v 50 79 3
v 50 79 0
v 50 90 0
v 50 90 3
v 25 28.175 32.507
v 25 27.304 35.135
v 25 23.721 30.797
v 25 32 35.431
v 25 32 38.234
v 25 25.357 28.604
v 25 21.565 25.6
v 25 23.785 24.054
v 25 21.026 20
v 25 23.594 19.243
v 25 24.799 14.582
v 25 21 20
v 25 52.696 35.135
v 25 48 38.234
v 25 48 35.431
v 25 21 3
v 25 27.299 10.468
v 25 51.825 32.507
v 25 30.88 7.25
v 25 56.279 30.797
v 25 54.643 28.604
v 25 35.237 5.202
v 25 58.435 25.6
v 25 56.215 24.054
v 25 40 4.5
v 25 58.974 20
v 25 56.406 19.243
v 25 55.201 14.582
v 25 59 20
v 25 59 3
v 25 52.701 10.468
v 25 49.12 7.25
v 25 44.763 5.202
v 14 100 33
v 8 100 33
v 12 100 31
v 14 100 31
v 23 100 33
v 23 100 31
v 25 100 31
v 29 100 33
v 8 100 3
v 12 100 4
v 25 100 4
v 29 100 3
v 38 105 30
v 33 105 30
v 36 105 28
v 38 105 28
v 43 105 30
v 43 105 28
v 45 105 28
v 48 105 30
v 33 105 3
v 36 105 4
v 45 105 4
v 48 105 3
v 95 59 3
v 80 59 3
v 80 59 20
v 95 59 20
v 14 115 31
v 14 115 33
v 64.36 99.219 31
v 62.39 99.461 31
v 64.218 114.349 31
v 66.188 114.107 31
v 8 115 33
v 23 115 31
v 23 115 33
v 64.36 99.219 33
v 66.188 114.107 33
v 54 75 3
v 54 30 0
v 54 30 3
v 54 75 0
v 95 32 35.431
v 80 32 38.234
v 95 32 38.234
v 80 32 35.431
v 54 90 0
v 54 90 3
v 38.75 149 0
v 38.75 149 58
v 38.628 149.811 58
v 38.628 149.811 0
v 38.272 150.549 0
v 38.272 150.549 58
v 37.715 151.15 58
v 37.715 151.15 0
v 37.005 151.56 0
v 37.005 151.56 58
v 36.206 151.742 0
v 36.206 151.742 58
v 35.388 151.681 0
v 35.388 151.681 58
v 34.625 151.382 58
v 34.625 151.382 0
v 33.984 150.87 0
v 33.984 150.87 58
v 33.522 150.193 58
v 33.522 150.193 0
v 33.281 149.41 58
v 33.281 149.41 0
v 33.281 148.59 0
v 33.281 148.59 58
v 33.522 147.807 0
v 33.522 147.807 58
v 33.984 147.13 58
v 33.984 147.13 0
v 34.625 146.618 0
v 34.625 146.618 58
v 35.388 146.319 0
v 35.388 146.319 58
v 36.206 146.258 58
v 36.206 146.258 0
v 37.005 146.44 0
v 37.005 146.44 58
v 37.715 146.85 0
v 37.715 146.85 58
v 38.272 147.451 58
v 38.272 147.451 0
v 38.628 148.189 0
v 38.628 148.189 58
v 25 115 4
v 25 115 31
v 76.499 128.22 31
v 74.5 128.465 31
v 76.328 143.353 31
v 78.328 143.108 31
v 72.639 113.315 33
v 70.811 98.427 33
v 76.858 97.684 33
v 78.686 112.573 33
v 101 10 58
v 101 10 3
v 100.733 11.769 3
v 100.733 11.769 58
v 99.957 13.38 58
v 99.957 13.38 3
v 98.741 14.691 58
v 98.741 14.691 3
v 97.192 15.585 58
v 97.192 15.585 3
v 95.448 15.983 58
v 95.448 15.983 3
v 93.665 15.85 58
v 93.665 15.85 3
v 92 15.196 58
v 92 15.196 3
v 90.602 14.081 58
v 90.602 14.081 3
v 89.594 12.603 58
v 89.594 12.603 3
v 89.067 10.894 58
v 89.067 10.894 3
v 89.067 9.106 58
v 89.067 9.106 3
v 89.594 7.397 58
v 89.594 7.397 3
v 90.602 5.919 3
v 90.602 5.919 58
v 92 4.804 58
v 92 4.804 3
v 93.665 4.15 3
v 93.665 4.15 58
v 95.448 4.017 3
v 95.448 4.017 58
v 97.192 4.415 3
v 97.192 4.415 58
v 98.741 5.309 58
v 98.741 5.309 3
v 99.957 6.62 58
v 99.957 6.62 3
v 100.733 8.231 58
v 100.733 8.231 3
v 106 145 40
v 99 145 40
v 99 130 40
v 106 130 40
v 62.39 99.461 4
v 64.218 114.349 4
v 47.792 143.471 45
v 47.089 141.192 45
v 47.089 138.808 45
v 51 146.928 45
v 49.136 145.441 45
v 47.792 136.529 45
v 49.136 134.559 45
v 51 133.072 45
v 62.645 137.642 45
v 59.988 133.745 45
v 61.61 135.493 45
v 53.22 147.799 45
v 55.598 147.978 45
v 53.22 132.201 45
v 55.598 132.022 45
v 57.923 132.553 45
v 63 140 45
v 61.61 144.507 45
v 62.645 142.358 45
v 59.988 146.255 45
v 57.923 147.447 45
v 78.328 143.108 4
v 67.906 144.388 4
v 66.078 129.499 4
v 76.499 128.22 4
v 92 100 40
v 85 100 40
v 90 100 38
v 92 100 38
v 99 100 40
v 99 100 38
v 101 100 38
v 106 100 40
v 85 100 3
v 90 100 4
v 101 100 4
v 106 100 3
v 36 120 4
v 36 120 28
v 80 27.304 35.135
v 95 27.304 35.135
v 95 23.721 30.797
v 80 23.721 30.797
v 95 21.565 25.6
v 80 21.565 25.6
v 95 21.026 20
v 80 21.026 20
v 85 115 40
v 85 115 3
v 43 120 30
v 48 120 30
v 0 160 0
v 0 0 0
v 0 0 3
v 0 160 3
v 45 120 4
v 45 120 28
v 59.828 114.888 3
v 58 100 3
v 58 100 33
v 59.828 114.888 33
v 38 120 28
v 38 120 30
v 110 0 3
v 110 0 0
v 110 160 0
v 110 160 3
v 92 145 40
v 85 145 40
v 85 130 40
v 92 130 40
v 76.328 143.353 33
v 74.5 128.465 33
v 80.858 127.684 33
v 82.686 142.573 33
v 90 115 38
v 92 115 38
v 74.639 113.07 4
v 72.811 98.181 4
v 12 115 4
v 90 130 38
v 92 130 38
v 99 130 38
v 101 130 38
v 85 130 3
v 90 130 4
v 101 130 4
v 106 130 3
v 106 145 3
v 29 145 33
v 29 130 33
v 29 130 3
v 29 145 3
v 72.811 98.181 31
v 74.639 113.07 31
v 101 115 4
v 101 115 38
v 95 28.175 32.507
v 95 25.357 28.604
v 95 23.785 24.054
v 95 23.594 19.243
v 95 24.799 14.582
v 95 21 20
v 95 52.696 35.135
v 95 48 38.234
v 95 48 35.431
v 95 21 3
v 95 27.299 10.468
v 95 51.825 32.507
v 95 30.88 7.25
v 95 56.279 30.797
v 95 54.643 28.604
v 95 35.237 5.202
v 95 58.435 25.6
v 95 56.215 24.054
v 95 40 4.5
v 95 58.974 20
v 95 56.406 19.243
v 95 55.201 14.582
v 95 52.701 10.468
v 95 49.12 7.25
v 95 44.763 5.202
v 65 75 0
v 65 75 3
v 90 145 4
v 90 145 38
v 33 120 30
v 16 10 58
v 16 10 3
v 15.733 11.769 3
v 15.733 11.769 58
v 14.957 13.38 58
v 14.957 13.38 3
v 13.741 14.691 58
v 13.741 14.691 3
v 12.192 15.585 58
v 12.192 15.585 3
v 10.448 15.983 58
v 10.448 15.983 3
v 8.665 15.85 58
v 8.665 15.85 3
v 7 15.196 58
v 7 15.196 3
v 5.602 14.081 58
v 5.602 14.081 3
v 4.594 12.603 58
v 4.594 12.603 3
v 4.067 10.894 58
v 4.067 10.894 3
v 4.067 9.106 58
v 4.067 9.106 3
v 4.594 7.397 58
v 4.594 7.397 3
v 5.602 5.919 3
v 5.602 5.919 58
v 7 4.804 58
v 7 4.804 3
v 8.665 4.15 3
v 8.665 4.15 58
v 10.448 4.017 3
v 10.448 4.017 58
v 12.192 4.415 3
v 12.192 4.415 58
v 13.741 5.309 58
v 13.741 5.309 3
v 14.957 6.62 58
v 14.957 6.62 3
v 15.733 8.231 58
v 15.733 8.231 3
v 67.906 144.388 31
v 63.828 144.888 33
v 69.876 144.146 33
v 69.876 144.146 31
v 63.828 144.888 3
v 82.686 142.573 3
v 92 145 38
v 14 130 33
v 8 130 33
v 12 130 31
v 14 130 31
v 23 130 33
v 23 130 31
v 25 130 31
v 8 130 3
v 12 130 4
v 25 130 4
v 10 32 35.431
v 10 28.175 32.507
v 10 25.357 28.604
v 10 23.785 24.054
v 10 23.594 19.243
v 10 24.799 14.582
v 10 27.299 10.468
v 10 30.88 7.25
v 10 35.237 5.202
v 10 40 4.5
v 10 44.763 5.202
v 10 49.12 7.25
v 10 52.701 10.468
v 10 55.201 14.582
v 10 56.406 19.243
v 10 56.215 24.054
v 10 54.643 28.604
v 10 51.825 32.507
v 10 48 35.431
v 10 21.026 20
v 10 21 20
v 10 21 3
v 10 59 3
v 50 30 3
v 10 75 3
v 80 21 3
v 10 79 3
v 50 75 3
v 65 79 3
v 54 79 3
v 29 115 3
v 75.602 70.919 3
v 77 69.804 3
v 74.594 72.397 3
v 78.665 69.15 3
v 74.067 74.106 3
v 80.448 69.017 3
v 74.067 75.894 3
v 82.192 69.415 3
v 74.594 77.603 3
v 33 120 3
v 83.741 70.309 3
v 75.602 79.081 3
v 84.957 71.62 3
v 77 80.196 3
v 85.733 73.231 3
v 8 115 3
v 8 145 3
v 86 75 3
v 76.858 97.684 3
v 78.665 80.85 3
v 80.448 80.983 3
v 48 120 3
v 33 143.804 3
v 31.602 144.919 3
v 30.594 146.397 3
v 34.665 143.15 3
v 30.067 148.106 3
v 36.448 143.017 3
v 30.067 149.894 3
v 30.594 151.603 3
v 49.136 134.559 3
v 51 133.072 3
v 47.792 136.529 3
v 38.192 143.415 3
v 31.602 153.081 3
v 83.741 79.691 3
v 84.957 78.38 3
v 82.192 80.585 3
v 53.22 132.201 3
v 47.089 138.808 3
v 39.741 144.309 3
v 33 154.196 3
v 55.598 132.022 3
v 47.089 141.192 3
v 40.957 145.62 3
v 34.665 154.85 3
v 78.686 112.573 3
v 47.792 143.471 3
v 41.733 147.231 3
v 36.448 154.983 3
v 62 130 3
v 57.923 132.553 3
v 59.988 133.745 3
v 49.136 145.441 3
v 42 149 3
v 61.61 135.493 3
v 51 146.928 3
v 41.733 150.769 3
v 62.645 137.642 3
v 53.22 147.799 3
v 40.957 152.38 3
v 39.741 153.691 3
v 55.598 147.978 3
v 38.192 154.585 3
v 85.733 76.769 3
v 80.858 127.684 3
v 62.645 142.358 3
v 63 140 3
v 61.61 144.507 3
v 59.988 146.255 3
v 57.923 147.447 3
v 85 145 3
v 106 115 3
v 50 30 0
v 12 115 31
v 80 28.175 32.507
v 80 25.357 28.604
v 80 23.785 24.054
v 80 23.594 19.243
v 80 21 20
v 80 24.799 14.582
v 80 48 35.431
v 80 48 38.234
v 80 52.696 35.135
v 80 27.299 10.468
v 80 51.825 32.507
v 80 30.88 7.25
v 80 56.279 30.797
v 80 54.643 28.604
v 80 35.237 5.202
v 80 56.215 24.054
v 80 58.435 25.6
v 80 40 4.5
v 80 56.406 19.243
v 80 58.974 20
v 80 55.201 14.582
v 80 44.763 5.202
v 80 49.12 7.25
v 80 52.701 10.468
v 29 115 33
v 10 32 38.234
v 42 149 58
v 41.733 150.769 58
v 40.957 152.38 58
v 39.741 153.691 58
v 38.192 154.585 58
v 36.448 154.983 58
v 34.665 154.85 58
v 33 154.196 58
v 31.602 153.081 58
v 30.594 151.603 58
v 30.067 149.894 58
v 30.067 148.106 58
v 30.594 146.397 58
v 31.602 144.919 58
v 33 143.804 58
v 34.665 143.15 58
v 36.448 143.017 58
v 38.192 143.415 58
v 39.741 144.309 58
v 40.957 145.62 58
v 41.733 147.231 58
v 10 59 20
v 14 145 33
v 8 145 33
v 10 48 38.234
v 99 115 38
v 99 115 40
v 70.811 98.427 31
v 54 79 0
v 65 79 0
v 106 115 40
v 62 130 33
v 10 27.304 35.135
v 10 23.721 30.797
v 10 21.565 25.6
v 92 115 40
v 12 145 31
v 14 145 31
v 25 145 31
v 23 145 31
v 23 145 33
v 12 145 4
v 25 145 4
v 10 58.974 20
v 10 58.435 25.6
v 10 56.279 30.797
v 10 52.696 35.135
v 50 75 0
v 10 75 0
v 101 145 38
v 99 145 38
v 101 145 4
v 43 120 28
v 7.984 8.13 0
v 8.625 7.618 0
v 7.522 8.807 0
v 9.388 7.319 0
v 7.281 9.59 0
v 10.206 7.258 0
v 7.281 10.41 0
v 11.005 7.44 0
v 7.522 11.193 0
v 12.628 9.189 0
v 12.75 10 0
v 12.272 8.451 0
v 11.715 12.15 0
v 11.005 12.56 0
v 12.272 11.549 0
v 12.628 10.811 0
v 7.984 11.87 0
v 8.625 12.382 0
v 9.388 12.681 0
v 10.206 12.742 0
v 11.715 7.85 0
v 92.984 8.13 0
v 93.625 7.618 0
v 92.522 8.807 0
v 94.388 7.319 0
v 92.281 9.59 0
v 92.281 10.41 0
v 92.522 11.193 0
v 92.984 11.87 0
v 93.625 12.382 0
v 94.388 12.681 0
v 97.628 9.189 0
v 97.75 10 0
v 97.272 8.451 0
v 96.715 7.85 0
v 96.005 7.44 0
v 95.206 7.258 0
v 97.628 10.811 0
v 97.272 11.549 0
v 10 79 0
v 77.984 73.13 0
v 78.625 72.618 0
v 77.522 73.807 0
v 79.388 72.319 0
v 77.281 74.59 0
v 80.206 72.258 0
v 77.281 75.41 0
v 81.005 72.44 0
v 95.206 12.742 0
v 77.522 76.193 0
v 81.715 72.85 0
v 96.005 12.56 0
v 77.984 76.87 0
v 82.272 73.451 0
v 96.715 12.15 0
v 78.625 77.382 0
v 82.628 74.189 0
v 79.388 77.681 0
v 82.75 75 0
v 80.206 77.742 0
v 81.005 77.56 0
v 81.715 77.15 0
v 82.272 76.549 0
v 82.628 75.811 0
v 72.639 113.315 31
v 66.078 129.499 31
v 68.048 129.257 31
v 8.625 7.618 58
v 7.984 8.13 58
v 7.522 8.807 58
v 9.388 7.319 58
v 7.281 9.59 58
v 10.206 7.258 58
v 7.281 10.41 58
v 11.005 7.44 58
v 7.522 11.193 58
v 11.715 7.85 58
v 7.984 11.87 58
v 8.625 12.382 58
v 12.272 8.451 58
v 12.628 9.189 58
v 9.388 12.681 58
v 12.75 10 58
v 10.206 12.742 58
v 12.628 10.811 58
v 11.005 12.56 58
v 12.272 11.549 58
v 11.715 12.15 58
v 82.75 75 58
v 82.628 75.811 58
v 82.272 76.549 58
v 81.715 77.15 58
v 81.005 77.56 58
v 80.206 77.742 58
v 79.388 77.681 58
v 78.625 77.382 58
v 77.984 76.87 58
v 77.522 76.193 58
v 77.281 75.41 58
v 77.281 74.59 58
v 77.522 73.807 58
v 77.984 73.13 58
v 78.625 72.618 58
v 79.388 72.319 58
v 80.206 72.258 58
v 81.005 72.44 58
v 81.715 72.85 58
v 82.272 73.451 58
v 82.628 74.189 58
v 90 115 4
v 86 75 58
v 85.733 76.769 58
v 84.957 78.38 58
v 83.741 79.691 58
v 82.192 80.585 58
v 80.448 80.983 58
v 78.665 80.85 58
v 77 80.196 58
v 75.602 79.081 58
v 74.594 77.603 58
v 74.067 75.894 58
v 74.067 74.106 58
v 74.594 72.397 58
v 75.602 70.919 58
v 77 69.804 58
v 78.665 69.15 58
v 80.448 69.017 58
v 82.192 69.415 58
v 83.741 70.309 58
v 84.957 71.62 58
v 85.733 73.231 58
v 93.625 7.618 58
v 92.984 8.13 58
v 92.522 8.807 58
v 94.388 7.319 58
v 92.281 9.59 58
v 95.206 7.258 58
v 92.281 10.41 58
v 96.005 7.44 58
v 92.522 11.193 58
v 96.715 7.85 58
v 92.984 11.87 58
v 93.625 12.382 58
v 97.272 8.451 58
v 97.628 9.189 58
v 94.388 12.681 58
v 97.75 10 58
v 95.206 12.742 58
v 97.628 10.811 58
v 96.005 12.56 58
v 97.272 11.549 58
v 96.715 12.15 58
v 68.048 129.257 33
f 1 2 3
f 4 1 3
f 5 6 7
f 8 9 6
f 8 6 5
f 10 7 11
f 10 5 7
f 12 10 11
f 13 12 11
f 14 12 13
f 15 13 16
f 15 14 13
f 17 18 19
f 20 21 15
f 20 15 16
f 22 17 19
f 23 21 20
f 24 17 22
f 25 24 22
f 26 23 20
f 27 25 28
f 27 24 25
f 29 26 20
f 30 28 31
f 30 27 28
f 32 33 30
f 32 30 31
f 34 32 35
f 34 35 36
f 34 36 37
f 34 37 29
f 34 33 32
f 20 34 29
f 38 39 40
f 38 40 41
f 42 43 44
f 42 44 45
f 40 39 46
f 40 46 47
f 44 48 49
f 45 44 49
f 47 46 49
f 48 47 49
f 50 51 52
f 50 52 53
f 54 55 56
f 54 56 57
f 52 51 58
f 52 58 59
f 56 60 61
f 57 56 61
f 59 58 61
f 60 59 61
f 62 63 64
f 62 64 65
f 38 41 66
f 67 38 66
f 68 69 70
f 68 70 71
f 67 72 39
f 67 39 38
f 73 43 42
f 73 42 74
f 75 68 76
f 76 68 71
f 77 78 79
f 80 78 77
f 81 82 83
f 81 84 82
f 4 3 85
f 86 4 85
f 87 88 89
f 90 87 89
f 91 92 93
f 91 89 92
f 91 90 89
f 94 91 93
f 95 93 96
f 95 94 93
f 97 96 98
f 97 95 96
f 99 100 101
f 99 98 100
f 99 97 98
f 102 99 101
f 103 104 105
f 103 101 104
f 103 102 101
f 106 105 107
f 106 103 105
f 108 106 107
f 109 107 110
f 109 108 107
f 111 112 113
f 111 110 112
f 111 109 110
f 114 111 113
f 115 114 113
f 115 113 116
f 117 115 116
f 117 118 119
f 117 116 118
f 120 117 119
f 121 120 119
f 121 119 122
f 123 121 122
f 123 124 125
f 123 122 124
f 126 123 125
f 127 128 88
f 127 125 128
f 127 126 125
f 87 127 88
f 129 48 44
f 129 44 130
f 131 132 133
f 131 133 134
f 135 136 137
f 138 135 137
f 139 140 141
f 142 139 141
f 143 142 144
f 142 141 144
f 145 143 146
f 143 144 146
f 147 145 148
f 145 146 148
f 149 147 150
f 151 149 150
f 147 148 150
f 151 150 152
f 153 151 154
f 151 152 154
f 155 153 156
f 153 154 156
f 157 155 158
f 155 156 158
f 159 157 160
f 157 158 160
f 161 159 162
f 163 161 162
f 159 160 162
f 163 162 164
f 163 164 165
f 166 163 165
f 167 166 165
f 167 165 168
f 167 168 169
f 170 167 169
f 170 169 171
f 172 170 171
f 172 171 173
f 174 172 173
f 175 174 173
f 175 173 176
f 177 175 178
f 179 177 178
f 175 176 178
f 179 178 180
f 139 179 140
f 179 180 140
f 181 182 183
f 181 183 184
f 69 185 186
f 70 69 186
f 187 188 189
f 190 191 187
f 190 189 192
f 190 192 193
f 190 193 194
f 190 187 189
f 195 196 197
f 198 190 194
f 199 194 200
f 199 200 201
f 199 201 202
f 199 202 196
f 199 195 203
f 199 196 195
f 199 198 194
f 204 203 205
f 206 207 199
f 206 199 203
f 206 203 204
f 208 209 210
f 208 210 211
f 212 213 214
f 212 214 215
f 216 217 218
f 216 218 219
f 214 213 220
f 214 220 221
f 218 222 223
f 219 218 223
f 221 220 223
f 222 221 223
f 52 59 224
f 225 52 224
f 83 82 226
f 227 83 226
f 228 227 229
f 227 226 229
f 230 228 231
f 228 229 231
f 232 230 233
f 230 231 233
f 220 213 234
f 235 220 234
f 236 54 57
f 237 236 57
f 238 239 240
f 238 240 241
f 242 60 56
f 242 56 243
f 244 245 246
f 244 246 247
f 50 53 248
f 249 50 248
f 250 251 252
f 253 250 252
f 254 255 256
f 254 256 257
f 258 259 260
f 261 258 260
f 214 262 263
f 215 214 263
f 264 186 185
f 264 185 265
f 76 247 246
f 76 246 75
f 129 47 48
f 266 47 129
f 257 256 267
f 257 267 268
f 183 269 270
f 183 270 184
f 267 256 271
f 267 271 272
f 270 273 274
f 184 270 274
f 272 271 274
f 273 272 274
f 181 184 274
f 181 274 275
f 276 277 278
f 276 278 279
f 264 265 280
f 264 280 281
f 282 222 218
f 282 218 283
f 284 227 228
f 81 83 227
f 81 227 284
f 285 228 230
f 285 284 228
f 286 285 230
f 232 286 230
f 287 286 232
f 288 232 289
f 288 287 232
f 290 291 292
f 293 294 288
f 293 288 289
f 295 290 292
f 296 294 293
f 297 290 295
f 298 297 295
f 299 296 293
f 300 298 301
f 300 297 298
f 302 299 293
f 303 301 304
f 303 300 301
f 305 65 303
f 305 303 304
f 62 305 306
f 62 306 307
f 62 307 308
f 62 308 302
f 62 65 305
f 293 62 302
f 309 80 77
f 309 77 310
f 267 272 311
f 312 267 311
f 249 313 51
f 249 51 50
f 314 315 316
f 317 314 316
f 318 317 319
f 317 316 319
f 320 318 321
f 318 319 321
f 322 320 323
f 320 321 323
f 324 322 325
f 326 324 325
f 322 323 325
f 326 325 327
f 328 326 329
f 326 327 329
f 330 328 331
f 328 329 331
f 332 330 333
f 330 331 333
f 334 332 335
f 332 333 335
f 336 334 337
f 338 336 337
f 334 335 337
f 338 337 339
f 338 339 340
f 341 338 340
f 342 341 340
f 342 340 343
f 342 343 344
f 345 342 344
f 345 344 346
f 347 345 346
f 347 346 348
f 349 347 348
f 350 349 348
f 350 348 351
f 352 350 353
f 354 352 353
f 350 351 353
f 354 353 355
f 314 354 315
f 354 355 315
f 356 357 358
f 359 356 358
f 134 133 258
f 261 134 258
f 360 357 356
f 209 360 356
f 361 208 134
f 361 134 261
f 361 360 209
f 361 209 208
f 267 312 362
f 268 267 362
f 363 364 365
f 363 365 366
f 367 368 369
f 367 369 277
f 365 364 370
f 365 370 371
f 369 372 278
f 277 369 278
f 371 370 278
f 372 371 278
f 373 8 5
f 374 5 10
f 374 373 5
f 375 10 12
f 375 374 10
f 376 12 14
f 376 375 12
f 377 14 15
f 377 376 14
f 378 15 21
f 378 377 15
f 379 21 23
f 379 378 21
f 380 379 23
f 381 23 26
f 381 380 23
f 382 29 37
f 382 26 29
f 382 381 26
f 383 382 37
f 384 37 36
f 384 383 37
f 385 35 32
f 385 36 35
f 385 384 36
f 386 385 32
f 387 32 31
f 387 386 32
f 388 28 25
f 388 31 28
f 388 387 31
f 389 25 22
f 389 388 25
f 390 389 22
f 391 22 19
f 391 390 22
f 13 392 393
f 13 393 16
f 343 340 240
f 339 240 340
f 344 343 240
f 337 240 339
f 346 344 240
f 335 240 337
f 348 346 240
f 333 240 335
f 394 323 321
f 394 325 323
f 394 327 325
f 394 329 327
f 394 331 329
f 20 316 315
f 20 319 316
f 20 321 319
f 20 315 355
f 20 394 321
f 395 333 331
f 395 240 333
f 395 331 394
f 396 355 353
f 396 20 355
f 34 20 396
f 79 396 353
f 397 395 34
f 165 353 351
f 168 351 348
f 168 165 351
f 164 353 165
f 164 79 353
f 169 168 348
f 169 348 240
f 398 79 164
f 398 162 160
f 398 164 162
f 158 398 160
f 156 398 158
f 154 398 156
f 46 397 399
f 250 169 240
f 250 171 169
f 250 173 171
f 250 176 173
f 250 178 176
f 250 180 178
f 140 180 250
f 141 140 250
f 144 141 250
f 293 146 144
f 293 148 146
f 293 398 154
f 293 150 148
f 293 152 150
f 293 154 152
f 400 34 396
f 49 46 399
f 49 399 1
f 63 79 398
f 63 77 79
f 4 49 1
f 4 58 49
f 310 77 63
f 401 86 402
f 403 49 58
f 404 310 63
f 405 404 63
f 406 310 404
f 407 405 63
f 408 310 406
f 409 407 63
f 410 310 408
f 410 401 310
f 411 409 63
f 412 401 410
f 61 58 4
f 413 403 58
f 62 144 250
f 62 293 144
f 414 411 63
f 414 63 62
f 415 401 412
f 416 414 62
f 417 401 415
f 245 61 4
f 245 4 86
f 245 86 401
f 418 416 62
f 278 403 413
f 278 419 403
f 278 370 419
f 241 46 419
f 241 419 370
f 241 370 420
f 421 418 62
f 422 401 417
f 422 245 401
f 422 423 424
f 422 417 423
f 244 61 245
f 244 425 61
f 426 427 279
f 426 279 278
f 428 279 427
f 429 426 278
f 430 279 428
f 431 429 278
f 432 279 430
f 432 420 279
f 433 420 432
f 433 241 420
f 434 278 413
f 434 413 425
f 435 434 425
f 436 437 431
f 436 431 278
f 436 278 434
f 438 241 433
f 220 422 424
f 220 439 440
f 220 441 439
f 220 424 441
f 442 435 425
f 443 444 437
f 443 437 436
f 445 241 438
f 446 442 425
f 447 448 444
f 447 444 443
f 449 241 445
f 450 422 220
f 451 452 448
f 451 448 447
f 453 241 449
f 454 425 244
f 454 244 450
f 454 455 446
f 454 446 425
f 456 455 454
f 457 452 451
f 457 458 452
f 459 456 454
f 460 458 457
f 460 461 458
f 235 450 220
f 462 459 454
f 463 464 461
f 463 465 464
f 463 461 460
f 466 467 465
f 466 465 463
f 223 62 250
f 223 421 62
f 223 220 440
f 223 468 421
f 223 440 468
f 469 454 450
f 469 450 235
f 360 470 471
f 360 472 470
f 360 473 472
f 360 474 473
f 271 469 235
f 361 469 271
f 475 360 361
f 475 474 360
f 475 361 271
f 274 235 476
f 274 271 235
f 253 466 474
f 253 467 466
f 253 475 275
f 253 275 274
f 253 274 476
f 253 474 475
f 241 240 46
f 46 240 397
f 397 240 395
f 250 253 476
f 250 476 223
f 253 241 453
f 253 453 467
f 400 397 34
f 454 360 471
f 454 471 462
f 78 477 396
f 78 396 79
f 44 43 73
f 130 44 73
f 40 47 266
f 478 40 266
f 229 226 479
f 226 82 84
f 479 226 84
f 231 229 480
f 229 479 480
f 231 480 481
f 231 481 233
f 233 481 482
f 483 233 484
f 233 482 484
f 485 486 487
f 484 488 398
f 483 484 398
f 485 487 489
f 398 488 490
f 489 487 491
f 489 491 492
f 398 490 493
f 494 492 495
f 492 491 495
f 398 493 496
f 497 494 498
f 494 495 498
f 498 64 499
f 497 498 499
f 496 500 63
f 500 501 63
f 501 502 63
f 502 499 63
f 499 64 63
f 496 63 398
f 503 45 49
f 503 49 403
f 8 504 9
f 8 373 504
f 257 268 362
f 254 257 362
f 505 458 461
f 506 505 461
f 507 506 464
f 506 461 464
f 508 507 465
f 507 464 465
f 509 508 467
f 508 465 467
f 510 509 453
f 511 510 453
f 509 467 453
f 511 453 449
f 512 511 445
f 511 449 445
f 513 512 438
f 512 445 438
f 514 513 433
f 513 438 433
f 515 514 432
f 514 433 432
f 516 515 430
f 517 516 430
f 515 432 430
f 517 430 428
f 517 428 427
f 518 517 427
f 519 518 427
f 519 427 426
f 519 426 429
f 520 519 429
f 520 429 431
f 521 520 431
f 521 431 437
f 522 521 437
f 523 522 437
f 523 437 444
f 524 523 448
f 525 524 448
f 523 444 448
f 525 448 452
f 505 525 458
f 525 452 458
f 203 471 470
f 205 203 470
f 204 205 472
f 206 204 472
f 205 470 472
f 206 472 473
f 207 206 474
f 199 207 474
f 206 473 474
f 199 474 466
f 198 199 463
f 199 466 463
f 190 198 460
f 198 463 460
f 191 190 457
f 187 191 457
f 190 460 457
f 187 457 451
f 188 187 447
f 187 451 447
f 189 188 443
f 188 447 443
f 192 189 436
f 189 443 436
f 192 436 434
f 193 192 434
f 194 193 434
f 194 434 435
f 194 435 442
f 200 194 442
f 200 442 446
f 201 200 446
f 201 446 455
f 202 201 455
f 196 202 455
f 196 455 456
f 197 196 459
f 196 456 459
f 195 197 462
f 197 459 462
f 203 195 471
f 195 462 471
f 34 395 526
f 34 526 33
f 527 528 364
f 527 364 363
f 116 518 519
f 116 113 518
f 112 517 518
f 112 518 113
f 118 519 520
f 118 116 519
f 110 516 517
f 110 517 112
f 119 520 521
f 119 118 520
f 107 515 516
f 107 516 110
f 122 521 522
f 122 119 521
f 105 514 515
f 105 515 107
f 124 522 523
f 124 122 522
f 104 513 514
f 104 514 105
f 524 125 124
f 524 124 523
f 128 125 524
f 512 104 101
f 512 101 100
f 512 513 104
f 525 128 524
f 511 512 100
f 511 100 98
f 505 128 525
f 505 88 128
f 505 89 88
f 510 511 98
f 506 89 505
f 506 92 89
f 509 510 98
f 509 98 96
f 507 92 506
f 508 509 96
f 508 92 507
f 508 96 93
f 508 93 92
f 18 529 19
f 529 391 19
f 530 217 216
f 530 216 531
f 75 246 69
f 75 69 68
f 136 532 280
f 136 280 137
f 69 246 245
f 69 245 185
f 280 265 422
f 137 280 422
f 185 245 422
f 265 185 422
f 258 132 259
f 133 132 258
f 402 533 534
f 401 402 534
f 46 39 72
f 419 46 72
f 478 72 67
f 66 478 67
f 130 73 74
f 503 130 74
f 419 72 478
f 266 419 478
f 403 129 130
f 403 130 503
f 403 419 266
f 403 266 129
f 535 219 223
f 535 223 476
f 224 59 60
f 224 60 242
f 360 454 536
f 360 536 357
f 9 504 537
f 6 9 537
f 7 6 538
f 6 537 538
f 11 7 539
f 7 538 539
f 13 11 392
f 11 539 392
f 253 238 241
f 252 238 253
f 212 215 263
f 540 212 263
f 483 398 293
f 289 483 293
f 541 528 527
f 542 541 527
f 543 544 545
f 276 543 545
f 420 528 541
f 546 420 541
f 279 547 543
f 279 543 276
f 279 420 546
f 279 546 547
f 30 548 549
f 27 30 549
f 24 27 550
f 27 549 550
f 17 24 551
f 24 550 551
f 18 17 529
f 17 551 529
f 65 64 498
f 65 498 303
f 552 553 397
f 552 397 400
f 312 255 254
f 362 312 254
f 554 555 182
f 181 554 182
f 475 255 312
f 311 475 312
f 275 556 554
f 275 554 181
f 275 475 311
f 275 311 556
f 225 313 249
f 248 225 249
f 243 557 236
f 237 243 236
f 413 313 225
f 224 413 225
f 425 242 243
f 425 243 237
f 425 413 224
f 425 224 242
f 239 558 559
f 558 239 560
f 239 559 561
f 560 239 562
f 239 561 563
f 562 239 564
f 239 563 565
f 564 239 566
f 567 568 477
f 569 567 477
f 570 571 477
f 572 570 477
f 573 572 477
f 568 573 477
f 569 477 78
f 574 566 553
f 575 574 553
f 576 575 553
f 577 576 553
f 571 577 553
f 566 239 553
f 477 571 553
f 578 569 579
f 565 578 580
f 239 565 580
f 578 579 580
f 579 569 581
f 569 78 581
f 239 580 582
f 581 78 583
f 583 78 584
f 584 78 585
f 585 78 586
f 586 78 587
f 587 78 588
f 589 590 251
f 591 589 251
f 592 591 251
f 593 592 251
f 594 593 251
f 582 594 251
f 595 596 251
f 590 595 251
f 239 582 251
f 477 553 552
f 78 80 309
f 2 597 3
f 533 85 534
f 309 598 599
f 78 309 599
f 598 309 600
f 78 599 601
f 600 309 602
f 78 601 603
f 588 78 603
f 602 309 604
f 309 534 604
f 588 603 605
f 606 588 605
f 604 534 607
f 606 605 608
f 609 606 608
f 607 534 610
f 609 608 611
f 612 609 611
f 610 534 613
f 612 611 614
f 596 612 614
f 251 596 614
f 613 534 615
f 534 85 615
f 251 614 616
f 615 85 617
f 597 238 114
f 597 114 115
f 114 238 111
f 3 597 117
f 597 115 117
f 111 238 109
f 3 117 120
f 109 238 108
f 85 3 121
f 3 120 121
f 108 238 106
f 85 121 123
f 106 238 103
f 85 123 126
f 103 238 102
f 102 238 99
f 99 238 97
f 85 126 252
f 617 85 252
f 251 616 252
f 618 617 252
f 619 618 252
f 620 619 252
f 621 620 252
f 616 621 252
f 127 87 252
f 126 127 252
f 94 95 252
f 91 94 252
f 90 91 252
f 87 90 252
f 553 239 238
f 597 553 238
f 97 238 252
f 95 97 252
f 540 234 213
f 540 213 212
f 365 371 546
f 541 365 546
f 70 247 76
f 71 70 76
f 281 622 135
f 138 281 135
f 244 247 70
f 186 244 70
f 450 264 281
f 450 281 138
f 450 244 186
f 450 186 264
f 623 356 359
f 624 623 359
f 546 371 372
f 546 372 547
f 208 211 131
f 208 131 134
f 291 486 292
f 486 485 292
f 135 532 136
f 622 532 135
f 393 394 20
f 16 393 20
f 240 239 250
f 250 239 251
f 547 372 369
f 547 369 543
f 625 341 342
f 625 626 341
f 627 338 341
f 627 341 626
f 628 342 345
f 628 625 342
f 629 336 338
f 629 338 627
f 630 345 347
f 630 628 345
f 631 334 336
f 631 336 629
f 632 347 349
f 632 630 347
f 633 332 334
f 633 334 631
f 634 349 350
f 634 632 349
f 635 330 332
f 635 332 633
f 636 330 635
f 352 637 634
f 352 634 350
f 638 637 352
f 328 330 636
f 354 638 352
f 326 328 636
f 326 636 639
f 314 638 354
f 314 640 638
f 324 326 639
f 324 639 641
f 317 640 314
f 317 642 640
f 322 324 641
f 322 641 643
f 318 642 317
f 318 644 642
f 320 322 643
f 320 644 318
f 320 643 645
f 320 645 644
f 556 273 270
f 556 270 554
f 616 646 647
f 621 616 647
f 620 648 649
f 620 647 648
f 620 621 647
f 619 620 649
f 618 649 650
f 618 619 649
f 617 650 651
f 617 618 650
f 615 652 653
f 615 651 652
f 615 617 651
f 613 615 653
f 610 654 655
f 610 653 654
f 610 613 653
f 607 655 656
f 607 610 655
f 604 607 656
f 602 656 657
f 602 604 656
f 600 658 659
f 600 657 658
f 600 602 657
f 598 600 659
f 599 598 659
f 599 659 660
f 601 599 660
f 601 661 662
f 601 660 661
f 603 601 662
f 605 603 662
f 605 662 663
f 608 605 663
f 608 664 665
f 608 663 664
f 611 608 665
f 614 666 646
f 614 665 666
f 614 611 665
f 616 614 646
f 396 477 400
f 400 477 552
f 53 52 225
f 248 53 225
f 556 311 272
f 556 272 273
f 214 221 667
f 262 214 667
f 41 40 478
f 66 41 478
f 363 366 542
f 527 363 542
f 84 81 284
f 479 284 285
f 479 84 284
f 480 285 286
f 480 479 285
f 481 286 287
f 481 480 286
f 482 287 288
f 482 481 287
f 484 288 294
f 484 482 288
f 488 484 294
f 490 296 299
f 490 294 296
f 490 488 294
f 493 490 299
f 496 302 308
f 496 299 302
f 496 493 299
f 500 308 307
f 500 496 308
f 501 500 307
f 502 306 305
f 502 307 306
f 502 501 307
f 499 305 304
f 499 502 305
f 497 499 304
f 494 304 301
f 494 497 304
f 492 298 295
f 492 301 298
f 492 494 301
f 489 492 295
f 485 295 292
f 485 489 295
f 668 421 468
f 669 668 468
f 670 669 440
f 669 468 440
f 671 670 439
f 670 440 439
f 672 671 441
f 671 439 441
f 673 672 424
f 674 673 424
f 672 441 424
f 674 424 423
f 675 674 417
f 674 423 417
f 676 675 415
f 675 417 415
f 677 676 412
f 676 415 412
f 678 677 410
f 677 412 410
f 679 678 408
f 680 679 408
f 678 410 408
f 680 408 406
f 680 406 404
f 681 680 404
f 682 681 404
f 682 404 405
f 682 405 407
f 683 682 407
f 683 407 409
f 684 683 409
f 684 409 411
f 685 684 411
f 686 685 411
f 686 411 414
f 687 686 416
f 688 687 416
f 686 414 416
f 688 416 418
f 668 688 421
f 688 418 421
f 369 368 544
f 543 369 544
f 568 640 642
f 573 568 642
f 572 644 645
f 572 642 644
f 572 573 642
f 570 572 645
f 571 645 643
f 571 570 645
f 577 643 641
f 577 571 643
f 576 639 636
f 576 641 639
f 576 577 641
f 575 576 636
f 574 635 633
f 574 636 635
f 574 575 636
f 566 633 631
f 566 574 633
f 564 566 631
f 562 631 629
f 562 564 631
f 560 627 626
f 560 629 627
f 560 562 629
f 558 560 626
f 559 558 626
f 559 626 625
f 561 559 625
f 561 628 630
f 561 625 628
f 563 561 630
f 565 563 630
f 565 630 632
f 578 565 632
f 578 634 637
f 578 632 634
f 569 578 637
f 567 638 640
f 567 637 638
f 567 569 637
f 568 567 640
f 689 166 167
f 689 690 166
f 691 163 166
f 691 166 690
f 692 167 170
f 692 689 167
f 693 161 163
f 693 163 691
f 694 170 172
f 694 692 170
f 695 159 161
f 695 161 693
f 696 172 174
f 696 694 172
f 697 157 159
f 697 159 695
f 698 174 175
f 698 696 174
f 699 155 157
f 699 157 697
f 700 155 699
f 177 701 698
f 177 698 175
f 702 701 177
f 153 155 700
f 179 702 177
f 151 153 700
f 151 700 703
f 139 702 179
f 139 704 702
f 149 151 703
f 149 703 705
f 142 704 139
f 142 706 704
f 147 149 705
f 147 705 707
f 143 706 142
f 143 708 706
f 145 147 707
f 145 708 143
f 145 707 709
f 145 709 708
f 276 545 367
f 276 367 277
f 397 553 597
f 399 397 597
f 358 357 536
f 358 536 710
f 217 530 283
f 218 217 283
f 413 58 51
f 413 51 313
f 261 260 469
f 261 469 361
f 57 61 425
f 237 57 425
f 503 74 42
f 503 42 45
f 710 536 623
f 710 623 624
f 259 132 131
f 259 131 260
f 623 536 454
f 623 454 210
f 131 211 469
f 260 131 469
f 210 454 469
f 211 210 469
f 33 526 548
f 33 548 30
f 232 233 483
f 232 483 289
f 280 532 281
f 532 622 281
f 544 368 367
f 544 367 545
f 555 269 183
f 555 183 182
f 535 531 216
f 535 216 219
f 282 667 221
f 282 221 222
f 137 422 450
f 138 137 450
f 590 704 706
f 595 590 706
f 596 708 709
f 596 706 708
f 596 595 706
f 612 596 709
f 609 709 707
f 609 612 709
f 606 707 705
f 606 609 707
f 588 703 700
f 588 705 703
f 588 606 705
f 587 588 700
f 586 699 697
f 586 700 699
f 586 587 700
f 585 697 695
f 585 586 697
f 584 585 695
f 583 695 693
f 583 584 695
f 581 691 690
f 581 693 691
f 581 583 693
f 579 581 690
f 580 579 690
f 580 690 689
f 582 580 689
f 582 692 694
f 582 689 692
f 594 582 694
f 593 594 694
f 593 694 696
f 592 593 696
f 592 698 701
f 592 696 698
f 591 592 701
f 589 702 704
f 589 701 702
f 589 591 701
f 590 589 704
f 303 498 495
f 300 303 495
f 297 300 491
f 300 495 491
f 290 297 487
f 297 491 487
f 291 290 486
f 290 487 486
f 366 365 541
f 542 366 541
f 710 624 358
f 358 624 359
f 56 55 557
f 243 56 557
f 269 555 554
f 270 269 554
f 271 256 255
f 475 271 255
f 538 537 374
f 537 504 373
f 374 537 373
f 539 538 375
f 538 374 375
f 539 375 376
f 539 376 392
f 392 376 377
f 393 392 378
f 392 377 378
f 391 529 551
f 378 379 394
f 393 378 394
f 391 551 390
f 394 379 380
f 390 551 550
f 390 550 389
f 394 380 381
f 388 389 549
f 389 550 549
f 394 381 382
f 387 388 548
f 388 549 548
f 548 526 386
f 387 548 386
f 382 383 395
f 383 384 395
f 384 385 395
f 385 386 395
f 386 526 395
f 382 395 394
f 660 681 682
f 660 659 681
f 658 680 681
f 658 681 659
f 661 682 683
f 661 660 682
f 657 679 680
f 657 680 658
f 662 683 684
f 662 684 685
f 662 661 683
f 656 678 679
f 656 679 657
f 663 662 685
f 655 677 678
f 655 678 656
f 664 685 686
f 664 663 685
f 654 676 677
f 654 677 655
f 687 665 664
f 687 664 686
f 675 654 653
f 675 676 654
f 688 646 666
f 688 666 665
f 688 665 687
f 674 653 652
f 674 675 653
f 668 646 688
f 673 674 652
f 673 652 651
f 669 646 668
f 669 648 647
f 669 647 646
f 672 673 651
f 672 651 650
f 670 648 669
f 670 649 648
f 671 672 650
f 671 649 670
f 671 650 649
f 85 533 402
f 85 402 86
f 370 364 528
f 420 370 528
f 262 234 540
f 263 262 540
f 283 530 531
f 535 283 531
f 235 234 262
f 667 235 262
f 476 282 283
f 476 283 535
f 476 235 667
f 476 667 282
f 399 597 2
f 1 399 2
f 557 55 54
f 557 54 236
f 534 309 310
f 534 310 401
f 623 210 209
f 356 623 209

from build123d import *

# Parameters (mm, degrees)
BOX003_W                = 52
BOX003_H                = 9
BOX003_DEPTH            = 24
BOX003_PLACEMENT_ANGLE  = 90
BOX008_W                = 52
BOX008_H                = 5
BOX008_DEPTH            = 24
BOX008_PLACEMENT_ANGLE  = 90
BOX007_W                = 15
BOX007_H                = 15
BOX007_DEPTH            = 30
BOX002_W                = 84
BOX002_H                = 13
BOX002_DEPTH            = 27
BOX002_PLACEMENT_ANGLE  = 90
BOX006_W                = 9
BOX006_H                = 60
BOX006_DEPTH            = 10
BOX004_W                = 21
BOX004_H                = 15
BOX004_DEPTH            = 33
BOX005_W                = 21
BOX005_H                = 15
BOX005_DEPTH            = 33
BOX034_W                = 10.5
BOX034_H                = 81
BOX034_DEPTH            = 27
BOX034_PLACEMENT_ANGLE  = -7
BOX035_W                = 6.5
BOX035_H                = 81
BOX035_DEPTH            = 34
BOX035_PLACEMENT_ANGLE  = -7
BOX037_W                = 19
BOX037_H                = 15
BOX037_DEPTH            = 33
BOX037_PLACEMENT_ANGLE  = -7
BOX036_W                = 19
BOX036_H                = 15
BOX036_DEPTH            = 33
BOX036_PLACEMENT_ANGLE  = -7
BOX010_W                = 11
BOX010_H                = 87
BOX010_DEPTH            = 34
BOX013_W                = 7
BOX013_H                = 87
BOX013_DEPTH            = 34
BOX011_W                = 21
BOX011_H                = 15
BOX011_DEPTH            = 40
BOX012_W                = 21
BOX012_H                = 15
BOX012_DEPTH            = 40
BOX020_W                = 4
BOX020_H                = 60
BOX020_DEPTH            = 10
BOX019_W                = 55
BOX019_H                = 4
BOX019_DEPTH            = 10
CYLINDER007_R           = 2.75
CYLINDER007_DEPTH       = 70
CYLINDER010_R           = 2.75
CYLINDER010_DEPTH       = 70
CYLINDER013_R           = 2.75
CYLINDER013_DEPTH       = 70
CYLINDER006_R           = 2.75
CYLINDER006_DEPTH       = 70
CYLINDER_R              = 6
CYLINDER_DEPTH          = 55
CYLINDER008_R           = 6
CYLINDER008_DEPTH       = 55
CYLINDER009_R           = 6
CYLINDER009_DEPTH       = 55
CYLINDER012_R           = 6
CYLINDER012_DEPTH       = 55
BOX_W                   = 110
BOX_H                   = 160
BOX_DEPTH               = 3
CYLINDER005_R           = 19
CYLINDER005_DEPTH       = 15
CYLINDER005_PITCH_ANGLE = 90
BOX033_W                = 15
BOX033_H                = 38
BOX033_DEPTH            = 19
BOX001_W                = 108
BOX001_H                = 16
BOX001_DEPTH            = 10
CYLINDER003_R           = 16.5
CYLINDER003_DEPTH       = 108
CYLINDER003_PITCH_ANGLE = 90
CYLINDER004_R           = 19
CYLINDER004_DEPTH       = 15
CYLINDER004_PITCH_ANGLE = 90
BOX032_W                = 15
BOX032_H                = 38
BOX032_DEPTH            = 19
CYLINDER011_R           = 8
CYLINDER011_DEPTH       = 42


with BuildPart() as gps:
    # Box003 → Box003 (new body)
    with BuildSketch(Plane.XY):
        with Locations((26, 4.5)):
            Rectangle(BOX003_W, BOX003_H)
    extrude(amount=BOX003_DEPTH)


with BuildPart() as gps_1:
    # Box003 placement: moved
    add(gps.part.moved(Location((45, 80, 4))).rotate(Axis((45, 80, 4), (0, 0, 1)), BOX003_PLACEMENT_ANGLE))


with BuildPart() as fusion002:
    # Box008 → Box008 (new body)
    with BuildSketch(Plane.XY):
        with Locations((26, 2.5)):
            Rectangle(BOX008_W, BOX008_H)
    extrude(amount=BOX008_DEPTH)


with BuildPart() as fusion002_1:
    # Box008 placement: moved
    add(fusion002.part.moved(Location((43, 80, 10))).rotate(Axis((43, 80, 10), (0, 0, 1)), BOX008_PLACEMENT_ANGLE))

    # Fusion002: union GPS
    add(gps_1.part)


with BuildPart() as gps_halterung:
    # Box007 → Box007 (new body)
    with BuildSketch(Plane(origin=(33, 105, 0), x_dir=(1, 0, 0), z_dir=(0, 0, 1))):
        with Locations((7.5, 7.5)):
            Rectangle(BOX007_W, BOX007_H)
    extrude(amount=BOX007_DEPTH)

    # Cut004: cut Fusion002
    add(fusion002_1.part, mode=Mode.SUBTRACT)


with BuildPart() as dvb_t:
    # Box002 → Box002 (new body)
    with BuildSketch(Plane.XY):
        with Locations((42, 6.5)):
            Rectangle(BOX002_W, BOX002_H)
    extrude(amount=BOX002_DEPTH)


with BuildPart() as dvb_t_1:
    # Box002 placement: moved
    add(dvb_t.part.moved(Location((25, 80, 4))).rotate(Axis((25, 80, 4), (0, 0, 1)), BOX002_PLACEMENT_ANGLE))


with BuildPart() as halterung:
    # Box006 → Box006 (new body)
    with BuildSketch(Plane(origin=(14, 95, 30), x_dir=(1, 0, 0), z_dir=(0, 0, 1))):
        with Locations((4.5, 30)):
            Rectangle(BOX006_W, BOX006_H)
    extrude(amount=BOX006_DEPTH)


with BuildPart() as w_rfel002:
    # Box004 → Box004 (new body)
    with BuildSketch(Plane(origin=(8, 100, 0), x_dir=(1, 0, 0), z_dir=(0, 0, 1))):
        with Locations((10.5, 7.5)):
            Rectangle(BOX004_W, BOX004_H)
    extrude(amount=BOX004_DEPTH)


with BuildPart() as dvb_t_halterung:
    # Box005 → Box005 (new body)
    with BuildSketch(Plane(origin=(8, 130, 0), x_dir=(1, 0, 0), z_dir=(0, 0, 1))):
        with Locations((10.5, 7.5)):
            Rectangle(BOX005_W, BOX005_H)
    extrude(amount=BOX005_DEPTH)

    # Fusion001: union Würfel002
    add(w_rfel002.part)

    # Cut002: cut Halterung
    add(halterung.part, mode=Mode.SUBTRACT)

    # Cut003: cut DVB-T
    add(dvb_t_1.part, mode=Mode.SUBTRACT)


with BuildPart() as huawei:
    # Box034 → Box034 (new body)
    with BuildSketch(Plane.XY):
        with Locations((5.25, 40.5)):
            Rectangle(BOX034_W, BOX034_H)
    extrude(amount=BOX034_DEPTH)


with BuildPart() as huawei_1:
    # Box034 placement: moved
    add(huawei.part.moved(Location((60, 80, 4))).rotate(Axis((60, 80, 4), (0, 0, 1)), BOX034_PLACEMENT_ANGLE))


with BuildPart() as fusion019:
    # Box035 → Box035 (new body)
    with BuildSketch(Plane.XY):
        with Locations((3.25, 40.5)):
            Rectangle(BOX035_W, BOX035_H)
    extrude(amount=BOX035_DEPTH)


with BuildPart() as fusion019_1:
    # Box035 placement: moved
    add(fusion019.part.moved(Location((62, 80, 10))).rotate(Axis((62, 80, 10), (0, 0, 1)), BOX035_PLACEMENT_ANGLE))

    # Fusion019: union Huawei
    add(huawei_1.part)


with BuildPart() as w_rfel028:
    # Box037 → Box037 (new body)
    with BuildSketch(Plane.XY):
        with Locations((9.5, 7.5)):
            Rectangle(BOX037_W, BOX037_H)
    extrude(amount=BOX037_DEPTH)


with BuildPart() as w_rfel028_1:
    # Box037 placement: moved
    add(w_rfel028.part.moved(Location((62, 130, 0))).rotate(Axis((62, 130, 0), (0, 0, 1)), BOX037_PLACEMENT_ANGLE))


with BuildPart() as huawei_halterung:
    # Box036 → Box036 (new body)
    with BuildSketch(Plane.XY):
        with Locations((9.5, 7.5)):
            Rectangle(BOX036_W, BOX036_H)
    extrude(amount=BOX036_DEPTH)


with BuildPart() as huawei_halterung_1:
    # Box036 placement: moved
    add(huawei_halterung.part.moved(Location((58, 100, 0))).rotate(Axis((58, 100, 0), (0, 0, 1)), BOX036_PLACEMENT_ANGLE))

    # Fusion018: union Würfel028
    add(w_rfel028_1.part)

    # Cut024: cut Fusion019
    add(fusion019_1.part, mode=Mode.SUBTRACT)


with BuildPart() as alfa:
    # Box010 → Box010 (new body)
    with BuildSketch(Plane(origin=(90, 80, 4), x_dir=(1, 0, 0), z_dir=(0, 0, 1))):
        with Locations((5.5, 43.5)):
            Rectangle(BOX010_W, BOX010_H)
    extrude(amount=BOX010_DEPTH)


with BuildPart() as fusion004:
    # Box013 → Box013 (new body)
    with BuildSketch(Plane(origin=(92, 80, 10), x_dir=(1, 0, 0), z_dir=(0, 0, 1))):
        with Locations((3.5, 43.5)):
            Rectangle(BOX013_W, BOX013_H)
    extrude(amount=BOX013_DEPTH)

    # Fusion004: union Alfa
    add(alfa.part)


with BuildPart() as w_rfel005:
    # Box011 → Box011 (new body)
    with BuildSketch(Plane(origin=(85, 130, 0), x_dir=(1, 0, 0), z_dir=(0, 0, 1))):
        with Locations((10.5, 7.5)):
            Rectangle(BOX011_W, BOX011_H)
    extrude(amount=BOX011_DEPTH)


with BuildPart() as alfa_halterung:
    # Box012 → Box012 (new body)
    with BuildSketch(Plane(origin=(85, 100, 0), x_dir=(1, 0, 0), z_dir=(0, 0, 1))):
        with Locations((10.5, 7.5)):
            Rectangle(BOX012_W, BOX012_H)
    extrude(amount=BOX012_DEPTH)

    # Fusion003: union Würfel005
    add(w_rfel005.part)

    # Cut005: cut Fusion004
    add(fusion004.part, mode=Mode.SUBTRACT)


with BuildPart() as w_rfel013:
    # Box020 → Box020 (new body)
    with BuildSketch(Plane(origin=(50, 30, -3), x_dir=(1, 0, 0), z_dir=(0, 0, 1))):
        with Locations((2, 30)):
            Rectangle(BOX020_W, BOX020_H)
    extrude(amount=BOX020_DEPTH)


with BuildPart() as fusion013:
    # Box019 → Box019 (new body)
    with BuildSketch(Plane(origin=(10, 75, -3), x_dir=(1, 0, 0), z_dir=(0, 0, 1))):
        with Locations((27.5, 2)):
            Rectangle(BOX019_W, BOX019_H)
    extrude(amount=BOX019_DEPTH)

    # Fusion013: union Würfel013
    add(w_rfel013.part)


with BuildPart() as cylinder007:
    # Cylinder007 → Cylinder007 (new body)
    with BuildSketch(Plane(origin=(36, 149, -3), x_dir=(1, 0, 0), z_dir=(0, 0, 1))):
        Circle(CYLINDER007_R)
    extrude(amount=CYLINDER007_DEPTH)


with BuildPart() as cylinder010:
    # Cylinder010 → Cylinder010 (new body)
    with BuildSketch(Plane(origin=(10, 10, -3), x_dir=(1, 0, 0), z_dir=(0, 0, 1))):
        Circle(CYLINDER010_R)
    extrude(amount=CYLINDER010_DEPTH)


with BuildPart() as cylinder013:
    # Cylinder013 → Cylinder013 (new body)
    with BuildSketch(Plane(origin=(80, 75, -3), x_dir=(1, 0, 0), z_dir=(0, 0, 1))):
        Circle(CYLINDER013_R)
    extrude(amount=CYLINDER013_DEPTH)


with BuildPart() as fusion010:
    # Cylinder006 → Cylinder006 (new body)
    with BuildSketch(Plane(origin=(95, 10, -3), x_dir=(1, 0, 0), z_dir=(0, 0, 1))):
        Circle(CYLINDER006_R)
    extrude(amount=CYLINDER006_DEPTH)

    # Fusion010: union Cylinder007, Cylinder010, Cylinder013
    add(cylinder007.part)
    add(cylinder010.part)
    add(cylinder013.part)


with BuildPart() as cylinder:
    # Cylinder → Cylinder (new body)
    with BuildSketch(Plane(origin=(10, 10, 3), x_dir=(1, 0, 0), z_dir=(0, 0, 1))):
        Circle(CYLINDER_R)
    extrude(amount=CYLINDER_DEPTH)


with BuildPart() as cylinder008:
    # Cylinder008 → Cylinder008 (new body)
    with BuildSketch(Plane(origin=(36, 149, 3), x_dir=(1, 0, 0), z_dir=(0, 0, 1))):
        Circle(CYLINDER008_R)
    extrude(amount=CYLINDER008_DEPTH)


with BuildPart() as cylinder009:
    # Cylinder009 → Cylinder009 (new body)
    with BuildSketch(Plane(origin=(95, 10, 3), x_dir=(1, 0, 0), z_dir=(0, 0, 1))):
        Circle(CYLINDER009_R)
    extrude(amount=CYLINDER009_DEPTH)


with BuildPart() as cylinder012:
    # Cylinder012 → Cylinder012 (new body)
    with BuildSketch(Plane(origin=(80, 75, 3), x_dir=(1, 0, 0), z_dir=(0, 0, 1))):
        Circle(CYLINDER012_R)
    extrude(amount=CYLINDER012_DEPTH)


with BuildPart() as bodenplatte:
    # Box → Box (new body)
    with BuildSketch(Plane.XY):
        with Locations((55, 80)):
            Rectangle(BOX_W, BOX_H)
    extrude(amount=BOX_DEPTH)

    # Fusion009: union Cylinder, Cylinder008, Cylinder009, Cylinder012
    add(cylinder.part)
    add(cylinder008.part)
    add(cylinder009.part)
    add(cylinder012.part)

    # Cut011: cut Fusion010
    add(fusion010.part, mode=Mode.SUBTRACT)

    # Cut016: cut Fusion013
    add(fusion013.part, mode=Mode.SUBTRACT)


with BuildPart() as powercore002:
    # Cylinder005 → Cylinder005 (new body)
    with BuildSketch(Plane.XY):
        Circle(CYLINDER005_R)
    extrude(amount=CYLINDER005_DEPTH)


with BuildPart() as powercore002_1:
    # Cylinder005 pitch: moved
    add(powercore002.part.rotate(Axis((0, 0, 0), (0, 1, 0)), CYLINDER005_PITCH_ANGLE))


with BuildPart() as powercore002_2:
    # Cylinder005 placement: moved
    add(powercore002_1.part.moved(Location((80, 40, 21))))


with BuildPart() as cut023:
    # Box033 → Box033 (new body)
    with BuildSketch(Plane(origin=(80, 21, 1), x_dir=(1, 0, 0), z_dir=(0, 0, 1))):
        with Locations((7.5, 19)):
            Rectangle(BOX033_W, BOX033_H)
    extrude(amount=BOX033_DEPTH)

    # Cut023: cut PowerCore002
    add(powercore002_2.part, mode=Mode.SUBTRACT)


with BuildPart() as w_rfel001:
    # Box001 → Box001 (new body)
    with BuildSketch(Plane(origin=(0, 32, 33), x_dir=(1, 0, 0), z_dir=(0, 0, 1))):
        with Locations((54, 8)):
            Rectangle(BOX001_W, BOX001_H)
    extrude(amount=BOX001_DEPTH)


with BuildPart() as powercore:
    # Cylinder003 → Cylinder003 (new body)
    with BuildSketch(Plane.XY):
        Circle(CYLINDER003_R)
    extrude(amount=CYLINDER003_DEPTH)


with BuildPart() as powercore_1:
    # Cylinder003 pitch: moved
    add(powercore.part.rotate(Axis((0, 0, 0), (0, 1, 0)), CYLINDER003_PITCH_ANGLE))


with BuildPart() as powercore_2:
    # Cylinder003 placement: moved
    add(powercore_1.part.moved(Location((0, 40, 21))))


with BuildPart() as powercore001:
    # Cylinder004 → Cylinder004 (new body)
    with BuildSketch(Plane.XY):
        Circle(CYLINDER004_R)
    extrude(amount=CYLINDER004_DEPTH)


with BuildPart() as powercore001_1:
    # Cylinder004 pitch: moved
    add(powercore001.part.rotate(Axis((0, 0, 0), (0, 1, 0)), CYLINDER004_PITCH_ANGLE))


with BuildPart() as powercore001_2:
    # Cylinder004 placement: moved
    add(powercore001_1.part.moved(Location((10, 40, 21))))


with BuildPart() as anker_powerbank:
    # Fusion base: copy of PowerCore001
    add(powercore001_2.part)

    # Fusion: union PowerCore002
    add(powercore002_2.part)

    # Cut: cut PowerCore
    add(powercore_2.part, mode=Mode.SUBTRACT)

    # Cut001: cut Würfel001
    add(w_rfel001.part, mode=Mode.SUBTRACT)


with BuildPart() as anker_powerbank_stabil:
    # Box032 → Box032 (new body)
    with BuildSketch(Plane(origin=(10, 21, 1), x_dir=(1, 0, 0), z_dir=(0, 0, 1))):
        with Locations((7.5, 19)):
            Rectangle(BOX032_W, BOX032_H)
    extrude(amount=BOX032_DEPTH)

    # Cut022: cut PowerCore001
    add(powercore001_2.part, mode=Mode.SUBTRACT)

    # Fusion017: union Cut023, Anker Powerbank
    add(cut023.part)
    add(anker_powerbank.part)


with BuildPart() as fusion020:
    # Cylinder011 → Cylinder011 (new body)
    with BuildSketch(Plane(origin=(55, 140, 3), x_dir=(1, 0, 0), z_dir=(0, 0, 1))):
        Circle(CYLINDER011_R)
    extrude(amount=CYLINDER011_DEPTH)

    # Fusion020: union GPS Halterung, DVB-T Halterung, HUAWEI Halterung, Alfa Halterung, Bodenplatte, Anker Powerbank stabil
    add(gps_halterung.part)
    add(dvb_t_halterung.part)
    add(huawei_halterung_1.part)
    add(alfa_halterung.part)
    add(bodenplatte.part)
    add(anker_powerbank_stabil.part)


solid = fusion020.part
